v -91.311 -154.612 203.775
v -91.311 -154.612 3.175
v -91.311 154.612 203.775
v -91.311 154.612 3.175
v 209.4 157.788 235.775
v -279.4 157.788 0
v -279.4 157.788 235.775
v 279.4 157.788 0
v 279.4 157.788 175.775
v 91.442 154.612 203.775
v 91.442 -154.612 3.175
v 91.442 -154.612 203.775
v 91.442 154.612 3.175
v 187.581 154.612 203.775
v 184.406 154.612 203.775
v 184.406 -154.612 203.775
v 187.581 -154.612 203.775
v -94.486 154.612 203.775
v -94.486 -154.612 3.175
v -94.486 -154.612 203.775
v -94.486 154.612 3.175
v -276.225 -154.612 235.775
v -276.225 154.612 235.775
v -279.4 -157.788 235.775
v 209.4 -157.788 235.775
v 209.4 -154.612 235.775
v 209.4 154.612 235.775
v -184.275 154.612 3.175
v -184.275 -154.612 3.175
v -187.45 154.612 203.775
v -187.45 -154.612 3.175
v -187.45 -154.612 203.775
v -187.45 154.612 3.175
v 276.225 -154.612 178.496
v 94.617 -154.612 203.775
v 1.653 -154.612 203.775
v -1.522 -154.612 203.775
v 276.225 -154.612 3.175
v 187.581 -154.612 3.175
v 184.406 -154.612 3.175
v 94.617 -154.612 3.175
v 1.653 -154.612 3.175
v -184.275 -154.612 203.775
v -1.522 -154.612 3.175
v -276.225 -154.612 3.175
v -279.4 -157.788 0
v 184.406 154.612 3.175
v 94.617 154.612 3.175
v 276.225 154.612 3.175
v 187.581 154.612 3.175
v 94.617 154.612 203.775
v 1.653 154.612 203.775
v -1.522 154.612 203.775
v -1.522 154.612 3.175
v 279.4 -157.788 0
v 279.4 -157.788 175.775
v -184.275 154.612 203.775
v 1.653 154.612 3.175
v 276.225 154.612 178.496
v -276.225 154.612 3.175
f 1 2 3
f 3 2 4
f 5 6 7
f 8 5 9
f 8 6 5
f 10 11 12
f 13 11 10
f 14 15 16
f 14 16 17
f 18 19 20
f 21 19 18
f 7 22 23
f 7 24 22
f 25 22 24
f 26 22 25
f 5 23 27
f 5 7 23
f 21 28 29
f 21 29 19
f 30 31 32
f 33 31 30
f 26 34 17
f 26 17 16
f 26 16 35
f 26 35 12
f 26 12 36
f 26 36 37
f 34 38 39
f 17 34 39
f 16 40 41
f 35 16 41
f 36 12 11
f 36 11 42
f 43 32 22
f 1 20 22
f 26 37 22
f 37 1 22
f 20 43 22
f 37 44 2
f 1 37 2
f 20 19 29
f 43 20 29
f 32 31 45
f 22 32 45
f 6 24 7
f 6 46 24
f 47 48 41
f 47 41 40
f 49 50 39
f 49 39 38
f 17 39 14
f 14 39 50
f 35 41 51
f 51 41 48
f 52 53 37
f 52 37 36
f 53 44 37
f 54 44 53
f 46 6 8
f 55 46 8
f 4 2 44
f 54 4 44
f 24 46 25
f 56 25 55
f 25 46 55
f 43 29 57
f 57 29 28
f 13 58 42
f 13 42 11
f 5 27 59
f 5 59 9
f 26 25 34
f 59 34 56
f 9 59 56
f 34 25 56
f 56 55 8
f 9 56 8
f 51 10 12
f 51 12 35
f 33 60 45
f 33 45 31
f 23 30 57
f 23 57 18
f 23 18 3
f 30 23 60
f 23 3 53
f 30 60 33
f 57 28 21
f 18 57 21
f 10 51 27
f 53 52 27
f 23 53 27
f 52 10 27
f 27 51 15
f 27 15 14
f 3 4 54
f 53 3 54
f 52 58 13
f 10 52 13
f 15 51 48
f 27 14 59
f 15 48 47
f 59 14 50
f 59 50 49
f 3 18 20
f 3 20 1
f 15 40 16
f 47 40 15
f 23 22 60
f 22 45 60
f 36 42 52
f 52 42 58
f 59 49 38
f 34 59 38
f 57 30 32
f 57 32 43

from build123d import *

# Parameters (mm, degrees)
SKETCH1_W           = 558.8
SKETCH1_H           = 315.575
BOSS_EXTRUDE1_DEPTH = 3.175
SKETCH2_W           = 558.8
SKETCH2_H           = 315.575
SKETCH2_W_2         = 88.644
SKETCH2_H_2         = 309.225
SKETCH2_W_3         = 89.789
SKETCH2_W_4         = 88.775
BOSS_EXTRUDE2_DEPTH = 200.6
SKETCH3_W           = 558.8
SKETCH3_H           = 315.575
BOSS_EXTRUDE3_DEPTH = 32
CUT_EXTRUDE1_DEPTH  = 483.951127186


with BuildPart() as part:
    # Sketch1 → Boss-Extrude1 (new body)
    with BuildSketch(Plane.XY):
        Rectangle(SKETCH1_W, SKETCH1_H)
    extrude(amount=BOSS_EXTRUDE1_DEPTH)

    # Sketch2 → Boss-Extrude2 (add)
    with BuildSketch(Plane.XY.offset(3.175)):
        Rectangle(SKETCH2_W, SKETCH2_H)
        with Locations((231.903, 0)):
            Rectangle(SKETCH2_W_2, SKETCH2_H_2, mode=Mode.SUBTRACT)
        with Locations((139.5115, 0)):
            Rectangle(SKETCH2_W_3, SKETCH2_H_2, mode=Mode.SUBTRACT)
        with Locations((46.5475, 0)):
            Rectangle(SKETCH2_W_3, SKETCH2_H_2, mode=Mode.SUBTRACT)
        with Locations((-46.4165, 0)):
            Rectangle(SKETCH2_W_3, SKETCH2_H_2, mode=Mode.SUBTRACT)
        with Locations((-139.3805, 0)):
            Rectangle(SKETCH2_W_3, SKETCH2_H_2, mode=Mode.SUBTRACT)
        with Locations((-231.8375, 0)):
            Rectangle(SKETCH2_W_4, SKETCH2_H_2, mode=Mode.SUBTRACT)
    extrude(amount=BOSS_EXTRUDE2_DEPTH)

    # Sketch3 → Boss-Extrude3 (add)
    with BuildSketch(Plane.XY.offset(203.775)):
        Rectangle(SKETCH3_W, SKETCH3_H)
        Polygon((187.581, 154.6125), (276.225, 154.6125), (276.225, -154.6125), (187.581, -154.6125), (184.406, -154.6125), (94.617, -154.6125), (91.442, -154.6125), (1.653, -154.6125), (-1.522, -154.6125), (-91.311, -154.6125), (-94.486, -154.6125), (-184.275, -154.6125), (-187.45, -154.6125), (-276.225, -154.6125), (-276.225, 154.6125), (-187.45, 154.6125), (-184.275, 154.6125), (-94.486, 154.6125), (-91.311, 154.6125), (-1.522, 154.6125), (1.653, 154.6125), (91.442, 154.6125), (94.617, 154.6125), (184.406, 154.6125), align=None, mode=Mode.SUBTRACT)
    extrude(amount=BOSS_EXTRUDE3_DEPTH)

    # Sketch4 → Cut-Extrude1 (cut, through all)
    with BuildSketch(Plane.XZ.offset(157.7875)):
        Polygon((279.4, 235.775), (209.4, 235.775), (279.4, 175.775), align=None)
    extrude(amount=-CUT_EXTRUDE1_DEPTH, mode=Mode.SUBTRACT)


solid = part.part
